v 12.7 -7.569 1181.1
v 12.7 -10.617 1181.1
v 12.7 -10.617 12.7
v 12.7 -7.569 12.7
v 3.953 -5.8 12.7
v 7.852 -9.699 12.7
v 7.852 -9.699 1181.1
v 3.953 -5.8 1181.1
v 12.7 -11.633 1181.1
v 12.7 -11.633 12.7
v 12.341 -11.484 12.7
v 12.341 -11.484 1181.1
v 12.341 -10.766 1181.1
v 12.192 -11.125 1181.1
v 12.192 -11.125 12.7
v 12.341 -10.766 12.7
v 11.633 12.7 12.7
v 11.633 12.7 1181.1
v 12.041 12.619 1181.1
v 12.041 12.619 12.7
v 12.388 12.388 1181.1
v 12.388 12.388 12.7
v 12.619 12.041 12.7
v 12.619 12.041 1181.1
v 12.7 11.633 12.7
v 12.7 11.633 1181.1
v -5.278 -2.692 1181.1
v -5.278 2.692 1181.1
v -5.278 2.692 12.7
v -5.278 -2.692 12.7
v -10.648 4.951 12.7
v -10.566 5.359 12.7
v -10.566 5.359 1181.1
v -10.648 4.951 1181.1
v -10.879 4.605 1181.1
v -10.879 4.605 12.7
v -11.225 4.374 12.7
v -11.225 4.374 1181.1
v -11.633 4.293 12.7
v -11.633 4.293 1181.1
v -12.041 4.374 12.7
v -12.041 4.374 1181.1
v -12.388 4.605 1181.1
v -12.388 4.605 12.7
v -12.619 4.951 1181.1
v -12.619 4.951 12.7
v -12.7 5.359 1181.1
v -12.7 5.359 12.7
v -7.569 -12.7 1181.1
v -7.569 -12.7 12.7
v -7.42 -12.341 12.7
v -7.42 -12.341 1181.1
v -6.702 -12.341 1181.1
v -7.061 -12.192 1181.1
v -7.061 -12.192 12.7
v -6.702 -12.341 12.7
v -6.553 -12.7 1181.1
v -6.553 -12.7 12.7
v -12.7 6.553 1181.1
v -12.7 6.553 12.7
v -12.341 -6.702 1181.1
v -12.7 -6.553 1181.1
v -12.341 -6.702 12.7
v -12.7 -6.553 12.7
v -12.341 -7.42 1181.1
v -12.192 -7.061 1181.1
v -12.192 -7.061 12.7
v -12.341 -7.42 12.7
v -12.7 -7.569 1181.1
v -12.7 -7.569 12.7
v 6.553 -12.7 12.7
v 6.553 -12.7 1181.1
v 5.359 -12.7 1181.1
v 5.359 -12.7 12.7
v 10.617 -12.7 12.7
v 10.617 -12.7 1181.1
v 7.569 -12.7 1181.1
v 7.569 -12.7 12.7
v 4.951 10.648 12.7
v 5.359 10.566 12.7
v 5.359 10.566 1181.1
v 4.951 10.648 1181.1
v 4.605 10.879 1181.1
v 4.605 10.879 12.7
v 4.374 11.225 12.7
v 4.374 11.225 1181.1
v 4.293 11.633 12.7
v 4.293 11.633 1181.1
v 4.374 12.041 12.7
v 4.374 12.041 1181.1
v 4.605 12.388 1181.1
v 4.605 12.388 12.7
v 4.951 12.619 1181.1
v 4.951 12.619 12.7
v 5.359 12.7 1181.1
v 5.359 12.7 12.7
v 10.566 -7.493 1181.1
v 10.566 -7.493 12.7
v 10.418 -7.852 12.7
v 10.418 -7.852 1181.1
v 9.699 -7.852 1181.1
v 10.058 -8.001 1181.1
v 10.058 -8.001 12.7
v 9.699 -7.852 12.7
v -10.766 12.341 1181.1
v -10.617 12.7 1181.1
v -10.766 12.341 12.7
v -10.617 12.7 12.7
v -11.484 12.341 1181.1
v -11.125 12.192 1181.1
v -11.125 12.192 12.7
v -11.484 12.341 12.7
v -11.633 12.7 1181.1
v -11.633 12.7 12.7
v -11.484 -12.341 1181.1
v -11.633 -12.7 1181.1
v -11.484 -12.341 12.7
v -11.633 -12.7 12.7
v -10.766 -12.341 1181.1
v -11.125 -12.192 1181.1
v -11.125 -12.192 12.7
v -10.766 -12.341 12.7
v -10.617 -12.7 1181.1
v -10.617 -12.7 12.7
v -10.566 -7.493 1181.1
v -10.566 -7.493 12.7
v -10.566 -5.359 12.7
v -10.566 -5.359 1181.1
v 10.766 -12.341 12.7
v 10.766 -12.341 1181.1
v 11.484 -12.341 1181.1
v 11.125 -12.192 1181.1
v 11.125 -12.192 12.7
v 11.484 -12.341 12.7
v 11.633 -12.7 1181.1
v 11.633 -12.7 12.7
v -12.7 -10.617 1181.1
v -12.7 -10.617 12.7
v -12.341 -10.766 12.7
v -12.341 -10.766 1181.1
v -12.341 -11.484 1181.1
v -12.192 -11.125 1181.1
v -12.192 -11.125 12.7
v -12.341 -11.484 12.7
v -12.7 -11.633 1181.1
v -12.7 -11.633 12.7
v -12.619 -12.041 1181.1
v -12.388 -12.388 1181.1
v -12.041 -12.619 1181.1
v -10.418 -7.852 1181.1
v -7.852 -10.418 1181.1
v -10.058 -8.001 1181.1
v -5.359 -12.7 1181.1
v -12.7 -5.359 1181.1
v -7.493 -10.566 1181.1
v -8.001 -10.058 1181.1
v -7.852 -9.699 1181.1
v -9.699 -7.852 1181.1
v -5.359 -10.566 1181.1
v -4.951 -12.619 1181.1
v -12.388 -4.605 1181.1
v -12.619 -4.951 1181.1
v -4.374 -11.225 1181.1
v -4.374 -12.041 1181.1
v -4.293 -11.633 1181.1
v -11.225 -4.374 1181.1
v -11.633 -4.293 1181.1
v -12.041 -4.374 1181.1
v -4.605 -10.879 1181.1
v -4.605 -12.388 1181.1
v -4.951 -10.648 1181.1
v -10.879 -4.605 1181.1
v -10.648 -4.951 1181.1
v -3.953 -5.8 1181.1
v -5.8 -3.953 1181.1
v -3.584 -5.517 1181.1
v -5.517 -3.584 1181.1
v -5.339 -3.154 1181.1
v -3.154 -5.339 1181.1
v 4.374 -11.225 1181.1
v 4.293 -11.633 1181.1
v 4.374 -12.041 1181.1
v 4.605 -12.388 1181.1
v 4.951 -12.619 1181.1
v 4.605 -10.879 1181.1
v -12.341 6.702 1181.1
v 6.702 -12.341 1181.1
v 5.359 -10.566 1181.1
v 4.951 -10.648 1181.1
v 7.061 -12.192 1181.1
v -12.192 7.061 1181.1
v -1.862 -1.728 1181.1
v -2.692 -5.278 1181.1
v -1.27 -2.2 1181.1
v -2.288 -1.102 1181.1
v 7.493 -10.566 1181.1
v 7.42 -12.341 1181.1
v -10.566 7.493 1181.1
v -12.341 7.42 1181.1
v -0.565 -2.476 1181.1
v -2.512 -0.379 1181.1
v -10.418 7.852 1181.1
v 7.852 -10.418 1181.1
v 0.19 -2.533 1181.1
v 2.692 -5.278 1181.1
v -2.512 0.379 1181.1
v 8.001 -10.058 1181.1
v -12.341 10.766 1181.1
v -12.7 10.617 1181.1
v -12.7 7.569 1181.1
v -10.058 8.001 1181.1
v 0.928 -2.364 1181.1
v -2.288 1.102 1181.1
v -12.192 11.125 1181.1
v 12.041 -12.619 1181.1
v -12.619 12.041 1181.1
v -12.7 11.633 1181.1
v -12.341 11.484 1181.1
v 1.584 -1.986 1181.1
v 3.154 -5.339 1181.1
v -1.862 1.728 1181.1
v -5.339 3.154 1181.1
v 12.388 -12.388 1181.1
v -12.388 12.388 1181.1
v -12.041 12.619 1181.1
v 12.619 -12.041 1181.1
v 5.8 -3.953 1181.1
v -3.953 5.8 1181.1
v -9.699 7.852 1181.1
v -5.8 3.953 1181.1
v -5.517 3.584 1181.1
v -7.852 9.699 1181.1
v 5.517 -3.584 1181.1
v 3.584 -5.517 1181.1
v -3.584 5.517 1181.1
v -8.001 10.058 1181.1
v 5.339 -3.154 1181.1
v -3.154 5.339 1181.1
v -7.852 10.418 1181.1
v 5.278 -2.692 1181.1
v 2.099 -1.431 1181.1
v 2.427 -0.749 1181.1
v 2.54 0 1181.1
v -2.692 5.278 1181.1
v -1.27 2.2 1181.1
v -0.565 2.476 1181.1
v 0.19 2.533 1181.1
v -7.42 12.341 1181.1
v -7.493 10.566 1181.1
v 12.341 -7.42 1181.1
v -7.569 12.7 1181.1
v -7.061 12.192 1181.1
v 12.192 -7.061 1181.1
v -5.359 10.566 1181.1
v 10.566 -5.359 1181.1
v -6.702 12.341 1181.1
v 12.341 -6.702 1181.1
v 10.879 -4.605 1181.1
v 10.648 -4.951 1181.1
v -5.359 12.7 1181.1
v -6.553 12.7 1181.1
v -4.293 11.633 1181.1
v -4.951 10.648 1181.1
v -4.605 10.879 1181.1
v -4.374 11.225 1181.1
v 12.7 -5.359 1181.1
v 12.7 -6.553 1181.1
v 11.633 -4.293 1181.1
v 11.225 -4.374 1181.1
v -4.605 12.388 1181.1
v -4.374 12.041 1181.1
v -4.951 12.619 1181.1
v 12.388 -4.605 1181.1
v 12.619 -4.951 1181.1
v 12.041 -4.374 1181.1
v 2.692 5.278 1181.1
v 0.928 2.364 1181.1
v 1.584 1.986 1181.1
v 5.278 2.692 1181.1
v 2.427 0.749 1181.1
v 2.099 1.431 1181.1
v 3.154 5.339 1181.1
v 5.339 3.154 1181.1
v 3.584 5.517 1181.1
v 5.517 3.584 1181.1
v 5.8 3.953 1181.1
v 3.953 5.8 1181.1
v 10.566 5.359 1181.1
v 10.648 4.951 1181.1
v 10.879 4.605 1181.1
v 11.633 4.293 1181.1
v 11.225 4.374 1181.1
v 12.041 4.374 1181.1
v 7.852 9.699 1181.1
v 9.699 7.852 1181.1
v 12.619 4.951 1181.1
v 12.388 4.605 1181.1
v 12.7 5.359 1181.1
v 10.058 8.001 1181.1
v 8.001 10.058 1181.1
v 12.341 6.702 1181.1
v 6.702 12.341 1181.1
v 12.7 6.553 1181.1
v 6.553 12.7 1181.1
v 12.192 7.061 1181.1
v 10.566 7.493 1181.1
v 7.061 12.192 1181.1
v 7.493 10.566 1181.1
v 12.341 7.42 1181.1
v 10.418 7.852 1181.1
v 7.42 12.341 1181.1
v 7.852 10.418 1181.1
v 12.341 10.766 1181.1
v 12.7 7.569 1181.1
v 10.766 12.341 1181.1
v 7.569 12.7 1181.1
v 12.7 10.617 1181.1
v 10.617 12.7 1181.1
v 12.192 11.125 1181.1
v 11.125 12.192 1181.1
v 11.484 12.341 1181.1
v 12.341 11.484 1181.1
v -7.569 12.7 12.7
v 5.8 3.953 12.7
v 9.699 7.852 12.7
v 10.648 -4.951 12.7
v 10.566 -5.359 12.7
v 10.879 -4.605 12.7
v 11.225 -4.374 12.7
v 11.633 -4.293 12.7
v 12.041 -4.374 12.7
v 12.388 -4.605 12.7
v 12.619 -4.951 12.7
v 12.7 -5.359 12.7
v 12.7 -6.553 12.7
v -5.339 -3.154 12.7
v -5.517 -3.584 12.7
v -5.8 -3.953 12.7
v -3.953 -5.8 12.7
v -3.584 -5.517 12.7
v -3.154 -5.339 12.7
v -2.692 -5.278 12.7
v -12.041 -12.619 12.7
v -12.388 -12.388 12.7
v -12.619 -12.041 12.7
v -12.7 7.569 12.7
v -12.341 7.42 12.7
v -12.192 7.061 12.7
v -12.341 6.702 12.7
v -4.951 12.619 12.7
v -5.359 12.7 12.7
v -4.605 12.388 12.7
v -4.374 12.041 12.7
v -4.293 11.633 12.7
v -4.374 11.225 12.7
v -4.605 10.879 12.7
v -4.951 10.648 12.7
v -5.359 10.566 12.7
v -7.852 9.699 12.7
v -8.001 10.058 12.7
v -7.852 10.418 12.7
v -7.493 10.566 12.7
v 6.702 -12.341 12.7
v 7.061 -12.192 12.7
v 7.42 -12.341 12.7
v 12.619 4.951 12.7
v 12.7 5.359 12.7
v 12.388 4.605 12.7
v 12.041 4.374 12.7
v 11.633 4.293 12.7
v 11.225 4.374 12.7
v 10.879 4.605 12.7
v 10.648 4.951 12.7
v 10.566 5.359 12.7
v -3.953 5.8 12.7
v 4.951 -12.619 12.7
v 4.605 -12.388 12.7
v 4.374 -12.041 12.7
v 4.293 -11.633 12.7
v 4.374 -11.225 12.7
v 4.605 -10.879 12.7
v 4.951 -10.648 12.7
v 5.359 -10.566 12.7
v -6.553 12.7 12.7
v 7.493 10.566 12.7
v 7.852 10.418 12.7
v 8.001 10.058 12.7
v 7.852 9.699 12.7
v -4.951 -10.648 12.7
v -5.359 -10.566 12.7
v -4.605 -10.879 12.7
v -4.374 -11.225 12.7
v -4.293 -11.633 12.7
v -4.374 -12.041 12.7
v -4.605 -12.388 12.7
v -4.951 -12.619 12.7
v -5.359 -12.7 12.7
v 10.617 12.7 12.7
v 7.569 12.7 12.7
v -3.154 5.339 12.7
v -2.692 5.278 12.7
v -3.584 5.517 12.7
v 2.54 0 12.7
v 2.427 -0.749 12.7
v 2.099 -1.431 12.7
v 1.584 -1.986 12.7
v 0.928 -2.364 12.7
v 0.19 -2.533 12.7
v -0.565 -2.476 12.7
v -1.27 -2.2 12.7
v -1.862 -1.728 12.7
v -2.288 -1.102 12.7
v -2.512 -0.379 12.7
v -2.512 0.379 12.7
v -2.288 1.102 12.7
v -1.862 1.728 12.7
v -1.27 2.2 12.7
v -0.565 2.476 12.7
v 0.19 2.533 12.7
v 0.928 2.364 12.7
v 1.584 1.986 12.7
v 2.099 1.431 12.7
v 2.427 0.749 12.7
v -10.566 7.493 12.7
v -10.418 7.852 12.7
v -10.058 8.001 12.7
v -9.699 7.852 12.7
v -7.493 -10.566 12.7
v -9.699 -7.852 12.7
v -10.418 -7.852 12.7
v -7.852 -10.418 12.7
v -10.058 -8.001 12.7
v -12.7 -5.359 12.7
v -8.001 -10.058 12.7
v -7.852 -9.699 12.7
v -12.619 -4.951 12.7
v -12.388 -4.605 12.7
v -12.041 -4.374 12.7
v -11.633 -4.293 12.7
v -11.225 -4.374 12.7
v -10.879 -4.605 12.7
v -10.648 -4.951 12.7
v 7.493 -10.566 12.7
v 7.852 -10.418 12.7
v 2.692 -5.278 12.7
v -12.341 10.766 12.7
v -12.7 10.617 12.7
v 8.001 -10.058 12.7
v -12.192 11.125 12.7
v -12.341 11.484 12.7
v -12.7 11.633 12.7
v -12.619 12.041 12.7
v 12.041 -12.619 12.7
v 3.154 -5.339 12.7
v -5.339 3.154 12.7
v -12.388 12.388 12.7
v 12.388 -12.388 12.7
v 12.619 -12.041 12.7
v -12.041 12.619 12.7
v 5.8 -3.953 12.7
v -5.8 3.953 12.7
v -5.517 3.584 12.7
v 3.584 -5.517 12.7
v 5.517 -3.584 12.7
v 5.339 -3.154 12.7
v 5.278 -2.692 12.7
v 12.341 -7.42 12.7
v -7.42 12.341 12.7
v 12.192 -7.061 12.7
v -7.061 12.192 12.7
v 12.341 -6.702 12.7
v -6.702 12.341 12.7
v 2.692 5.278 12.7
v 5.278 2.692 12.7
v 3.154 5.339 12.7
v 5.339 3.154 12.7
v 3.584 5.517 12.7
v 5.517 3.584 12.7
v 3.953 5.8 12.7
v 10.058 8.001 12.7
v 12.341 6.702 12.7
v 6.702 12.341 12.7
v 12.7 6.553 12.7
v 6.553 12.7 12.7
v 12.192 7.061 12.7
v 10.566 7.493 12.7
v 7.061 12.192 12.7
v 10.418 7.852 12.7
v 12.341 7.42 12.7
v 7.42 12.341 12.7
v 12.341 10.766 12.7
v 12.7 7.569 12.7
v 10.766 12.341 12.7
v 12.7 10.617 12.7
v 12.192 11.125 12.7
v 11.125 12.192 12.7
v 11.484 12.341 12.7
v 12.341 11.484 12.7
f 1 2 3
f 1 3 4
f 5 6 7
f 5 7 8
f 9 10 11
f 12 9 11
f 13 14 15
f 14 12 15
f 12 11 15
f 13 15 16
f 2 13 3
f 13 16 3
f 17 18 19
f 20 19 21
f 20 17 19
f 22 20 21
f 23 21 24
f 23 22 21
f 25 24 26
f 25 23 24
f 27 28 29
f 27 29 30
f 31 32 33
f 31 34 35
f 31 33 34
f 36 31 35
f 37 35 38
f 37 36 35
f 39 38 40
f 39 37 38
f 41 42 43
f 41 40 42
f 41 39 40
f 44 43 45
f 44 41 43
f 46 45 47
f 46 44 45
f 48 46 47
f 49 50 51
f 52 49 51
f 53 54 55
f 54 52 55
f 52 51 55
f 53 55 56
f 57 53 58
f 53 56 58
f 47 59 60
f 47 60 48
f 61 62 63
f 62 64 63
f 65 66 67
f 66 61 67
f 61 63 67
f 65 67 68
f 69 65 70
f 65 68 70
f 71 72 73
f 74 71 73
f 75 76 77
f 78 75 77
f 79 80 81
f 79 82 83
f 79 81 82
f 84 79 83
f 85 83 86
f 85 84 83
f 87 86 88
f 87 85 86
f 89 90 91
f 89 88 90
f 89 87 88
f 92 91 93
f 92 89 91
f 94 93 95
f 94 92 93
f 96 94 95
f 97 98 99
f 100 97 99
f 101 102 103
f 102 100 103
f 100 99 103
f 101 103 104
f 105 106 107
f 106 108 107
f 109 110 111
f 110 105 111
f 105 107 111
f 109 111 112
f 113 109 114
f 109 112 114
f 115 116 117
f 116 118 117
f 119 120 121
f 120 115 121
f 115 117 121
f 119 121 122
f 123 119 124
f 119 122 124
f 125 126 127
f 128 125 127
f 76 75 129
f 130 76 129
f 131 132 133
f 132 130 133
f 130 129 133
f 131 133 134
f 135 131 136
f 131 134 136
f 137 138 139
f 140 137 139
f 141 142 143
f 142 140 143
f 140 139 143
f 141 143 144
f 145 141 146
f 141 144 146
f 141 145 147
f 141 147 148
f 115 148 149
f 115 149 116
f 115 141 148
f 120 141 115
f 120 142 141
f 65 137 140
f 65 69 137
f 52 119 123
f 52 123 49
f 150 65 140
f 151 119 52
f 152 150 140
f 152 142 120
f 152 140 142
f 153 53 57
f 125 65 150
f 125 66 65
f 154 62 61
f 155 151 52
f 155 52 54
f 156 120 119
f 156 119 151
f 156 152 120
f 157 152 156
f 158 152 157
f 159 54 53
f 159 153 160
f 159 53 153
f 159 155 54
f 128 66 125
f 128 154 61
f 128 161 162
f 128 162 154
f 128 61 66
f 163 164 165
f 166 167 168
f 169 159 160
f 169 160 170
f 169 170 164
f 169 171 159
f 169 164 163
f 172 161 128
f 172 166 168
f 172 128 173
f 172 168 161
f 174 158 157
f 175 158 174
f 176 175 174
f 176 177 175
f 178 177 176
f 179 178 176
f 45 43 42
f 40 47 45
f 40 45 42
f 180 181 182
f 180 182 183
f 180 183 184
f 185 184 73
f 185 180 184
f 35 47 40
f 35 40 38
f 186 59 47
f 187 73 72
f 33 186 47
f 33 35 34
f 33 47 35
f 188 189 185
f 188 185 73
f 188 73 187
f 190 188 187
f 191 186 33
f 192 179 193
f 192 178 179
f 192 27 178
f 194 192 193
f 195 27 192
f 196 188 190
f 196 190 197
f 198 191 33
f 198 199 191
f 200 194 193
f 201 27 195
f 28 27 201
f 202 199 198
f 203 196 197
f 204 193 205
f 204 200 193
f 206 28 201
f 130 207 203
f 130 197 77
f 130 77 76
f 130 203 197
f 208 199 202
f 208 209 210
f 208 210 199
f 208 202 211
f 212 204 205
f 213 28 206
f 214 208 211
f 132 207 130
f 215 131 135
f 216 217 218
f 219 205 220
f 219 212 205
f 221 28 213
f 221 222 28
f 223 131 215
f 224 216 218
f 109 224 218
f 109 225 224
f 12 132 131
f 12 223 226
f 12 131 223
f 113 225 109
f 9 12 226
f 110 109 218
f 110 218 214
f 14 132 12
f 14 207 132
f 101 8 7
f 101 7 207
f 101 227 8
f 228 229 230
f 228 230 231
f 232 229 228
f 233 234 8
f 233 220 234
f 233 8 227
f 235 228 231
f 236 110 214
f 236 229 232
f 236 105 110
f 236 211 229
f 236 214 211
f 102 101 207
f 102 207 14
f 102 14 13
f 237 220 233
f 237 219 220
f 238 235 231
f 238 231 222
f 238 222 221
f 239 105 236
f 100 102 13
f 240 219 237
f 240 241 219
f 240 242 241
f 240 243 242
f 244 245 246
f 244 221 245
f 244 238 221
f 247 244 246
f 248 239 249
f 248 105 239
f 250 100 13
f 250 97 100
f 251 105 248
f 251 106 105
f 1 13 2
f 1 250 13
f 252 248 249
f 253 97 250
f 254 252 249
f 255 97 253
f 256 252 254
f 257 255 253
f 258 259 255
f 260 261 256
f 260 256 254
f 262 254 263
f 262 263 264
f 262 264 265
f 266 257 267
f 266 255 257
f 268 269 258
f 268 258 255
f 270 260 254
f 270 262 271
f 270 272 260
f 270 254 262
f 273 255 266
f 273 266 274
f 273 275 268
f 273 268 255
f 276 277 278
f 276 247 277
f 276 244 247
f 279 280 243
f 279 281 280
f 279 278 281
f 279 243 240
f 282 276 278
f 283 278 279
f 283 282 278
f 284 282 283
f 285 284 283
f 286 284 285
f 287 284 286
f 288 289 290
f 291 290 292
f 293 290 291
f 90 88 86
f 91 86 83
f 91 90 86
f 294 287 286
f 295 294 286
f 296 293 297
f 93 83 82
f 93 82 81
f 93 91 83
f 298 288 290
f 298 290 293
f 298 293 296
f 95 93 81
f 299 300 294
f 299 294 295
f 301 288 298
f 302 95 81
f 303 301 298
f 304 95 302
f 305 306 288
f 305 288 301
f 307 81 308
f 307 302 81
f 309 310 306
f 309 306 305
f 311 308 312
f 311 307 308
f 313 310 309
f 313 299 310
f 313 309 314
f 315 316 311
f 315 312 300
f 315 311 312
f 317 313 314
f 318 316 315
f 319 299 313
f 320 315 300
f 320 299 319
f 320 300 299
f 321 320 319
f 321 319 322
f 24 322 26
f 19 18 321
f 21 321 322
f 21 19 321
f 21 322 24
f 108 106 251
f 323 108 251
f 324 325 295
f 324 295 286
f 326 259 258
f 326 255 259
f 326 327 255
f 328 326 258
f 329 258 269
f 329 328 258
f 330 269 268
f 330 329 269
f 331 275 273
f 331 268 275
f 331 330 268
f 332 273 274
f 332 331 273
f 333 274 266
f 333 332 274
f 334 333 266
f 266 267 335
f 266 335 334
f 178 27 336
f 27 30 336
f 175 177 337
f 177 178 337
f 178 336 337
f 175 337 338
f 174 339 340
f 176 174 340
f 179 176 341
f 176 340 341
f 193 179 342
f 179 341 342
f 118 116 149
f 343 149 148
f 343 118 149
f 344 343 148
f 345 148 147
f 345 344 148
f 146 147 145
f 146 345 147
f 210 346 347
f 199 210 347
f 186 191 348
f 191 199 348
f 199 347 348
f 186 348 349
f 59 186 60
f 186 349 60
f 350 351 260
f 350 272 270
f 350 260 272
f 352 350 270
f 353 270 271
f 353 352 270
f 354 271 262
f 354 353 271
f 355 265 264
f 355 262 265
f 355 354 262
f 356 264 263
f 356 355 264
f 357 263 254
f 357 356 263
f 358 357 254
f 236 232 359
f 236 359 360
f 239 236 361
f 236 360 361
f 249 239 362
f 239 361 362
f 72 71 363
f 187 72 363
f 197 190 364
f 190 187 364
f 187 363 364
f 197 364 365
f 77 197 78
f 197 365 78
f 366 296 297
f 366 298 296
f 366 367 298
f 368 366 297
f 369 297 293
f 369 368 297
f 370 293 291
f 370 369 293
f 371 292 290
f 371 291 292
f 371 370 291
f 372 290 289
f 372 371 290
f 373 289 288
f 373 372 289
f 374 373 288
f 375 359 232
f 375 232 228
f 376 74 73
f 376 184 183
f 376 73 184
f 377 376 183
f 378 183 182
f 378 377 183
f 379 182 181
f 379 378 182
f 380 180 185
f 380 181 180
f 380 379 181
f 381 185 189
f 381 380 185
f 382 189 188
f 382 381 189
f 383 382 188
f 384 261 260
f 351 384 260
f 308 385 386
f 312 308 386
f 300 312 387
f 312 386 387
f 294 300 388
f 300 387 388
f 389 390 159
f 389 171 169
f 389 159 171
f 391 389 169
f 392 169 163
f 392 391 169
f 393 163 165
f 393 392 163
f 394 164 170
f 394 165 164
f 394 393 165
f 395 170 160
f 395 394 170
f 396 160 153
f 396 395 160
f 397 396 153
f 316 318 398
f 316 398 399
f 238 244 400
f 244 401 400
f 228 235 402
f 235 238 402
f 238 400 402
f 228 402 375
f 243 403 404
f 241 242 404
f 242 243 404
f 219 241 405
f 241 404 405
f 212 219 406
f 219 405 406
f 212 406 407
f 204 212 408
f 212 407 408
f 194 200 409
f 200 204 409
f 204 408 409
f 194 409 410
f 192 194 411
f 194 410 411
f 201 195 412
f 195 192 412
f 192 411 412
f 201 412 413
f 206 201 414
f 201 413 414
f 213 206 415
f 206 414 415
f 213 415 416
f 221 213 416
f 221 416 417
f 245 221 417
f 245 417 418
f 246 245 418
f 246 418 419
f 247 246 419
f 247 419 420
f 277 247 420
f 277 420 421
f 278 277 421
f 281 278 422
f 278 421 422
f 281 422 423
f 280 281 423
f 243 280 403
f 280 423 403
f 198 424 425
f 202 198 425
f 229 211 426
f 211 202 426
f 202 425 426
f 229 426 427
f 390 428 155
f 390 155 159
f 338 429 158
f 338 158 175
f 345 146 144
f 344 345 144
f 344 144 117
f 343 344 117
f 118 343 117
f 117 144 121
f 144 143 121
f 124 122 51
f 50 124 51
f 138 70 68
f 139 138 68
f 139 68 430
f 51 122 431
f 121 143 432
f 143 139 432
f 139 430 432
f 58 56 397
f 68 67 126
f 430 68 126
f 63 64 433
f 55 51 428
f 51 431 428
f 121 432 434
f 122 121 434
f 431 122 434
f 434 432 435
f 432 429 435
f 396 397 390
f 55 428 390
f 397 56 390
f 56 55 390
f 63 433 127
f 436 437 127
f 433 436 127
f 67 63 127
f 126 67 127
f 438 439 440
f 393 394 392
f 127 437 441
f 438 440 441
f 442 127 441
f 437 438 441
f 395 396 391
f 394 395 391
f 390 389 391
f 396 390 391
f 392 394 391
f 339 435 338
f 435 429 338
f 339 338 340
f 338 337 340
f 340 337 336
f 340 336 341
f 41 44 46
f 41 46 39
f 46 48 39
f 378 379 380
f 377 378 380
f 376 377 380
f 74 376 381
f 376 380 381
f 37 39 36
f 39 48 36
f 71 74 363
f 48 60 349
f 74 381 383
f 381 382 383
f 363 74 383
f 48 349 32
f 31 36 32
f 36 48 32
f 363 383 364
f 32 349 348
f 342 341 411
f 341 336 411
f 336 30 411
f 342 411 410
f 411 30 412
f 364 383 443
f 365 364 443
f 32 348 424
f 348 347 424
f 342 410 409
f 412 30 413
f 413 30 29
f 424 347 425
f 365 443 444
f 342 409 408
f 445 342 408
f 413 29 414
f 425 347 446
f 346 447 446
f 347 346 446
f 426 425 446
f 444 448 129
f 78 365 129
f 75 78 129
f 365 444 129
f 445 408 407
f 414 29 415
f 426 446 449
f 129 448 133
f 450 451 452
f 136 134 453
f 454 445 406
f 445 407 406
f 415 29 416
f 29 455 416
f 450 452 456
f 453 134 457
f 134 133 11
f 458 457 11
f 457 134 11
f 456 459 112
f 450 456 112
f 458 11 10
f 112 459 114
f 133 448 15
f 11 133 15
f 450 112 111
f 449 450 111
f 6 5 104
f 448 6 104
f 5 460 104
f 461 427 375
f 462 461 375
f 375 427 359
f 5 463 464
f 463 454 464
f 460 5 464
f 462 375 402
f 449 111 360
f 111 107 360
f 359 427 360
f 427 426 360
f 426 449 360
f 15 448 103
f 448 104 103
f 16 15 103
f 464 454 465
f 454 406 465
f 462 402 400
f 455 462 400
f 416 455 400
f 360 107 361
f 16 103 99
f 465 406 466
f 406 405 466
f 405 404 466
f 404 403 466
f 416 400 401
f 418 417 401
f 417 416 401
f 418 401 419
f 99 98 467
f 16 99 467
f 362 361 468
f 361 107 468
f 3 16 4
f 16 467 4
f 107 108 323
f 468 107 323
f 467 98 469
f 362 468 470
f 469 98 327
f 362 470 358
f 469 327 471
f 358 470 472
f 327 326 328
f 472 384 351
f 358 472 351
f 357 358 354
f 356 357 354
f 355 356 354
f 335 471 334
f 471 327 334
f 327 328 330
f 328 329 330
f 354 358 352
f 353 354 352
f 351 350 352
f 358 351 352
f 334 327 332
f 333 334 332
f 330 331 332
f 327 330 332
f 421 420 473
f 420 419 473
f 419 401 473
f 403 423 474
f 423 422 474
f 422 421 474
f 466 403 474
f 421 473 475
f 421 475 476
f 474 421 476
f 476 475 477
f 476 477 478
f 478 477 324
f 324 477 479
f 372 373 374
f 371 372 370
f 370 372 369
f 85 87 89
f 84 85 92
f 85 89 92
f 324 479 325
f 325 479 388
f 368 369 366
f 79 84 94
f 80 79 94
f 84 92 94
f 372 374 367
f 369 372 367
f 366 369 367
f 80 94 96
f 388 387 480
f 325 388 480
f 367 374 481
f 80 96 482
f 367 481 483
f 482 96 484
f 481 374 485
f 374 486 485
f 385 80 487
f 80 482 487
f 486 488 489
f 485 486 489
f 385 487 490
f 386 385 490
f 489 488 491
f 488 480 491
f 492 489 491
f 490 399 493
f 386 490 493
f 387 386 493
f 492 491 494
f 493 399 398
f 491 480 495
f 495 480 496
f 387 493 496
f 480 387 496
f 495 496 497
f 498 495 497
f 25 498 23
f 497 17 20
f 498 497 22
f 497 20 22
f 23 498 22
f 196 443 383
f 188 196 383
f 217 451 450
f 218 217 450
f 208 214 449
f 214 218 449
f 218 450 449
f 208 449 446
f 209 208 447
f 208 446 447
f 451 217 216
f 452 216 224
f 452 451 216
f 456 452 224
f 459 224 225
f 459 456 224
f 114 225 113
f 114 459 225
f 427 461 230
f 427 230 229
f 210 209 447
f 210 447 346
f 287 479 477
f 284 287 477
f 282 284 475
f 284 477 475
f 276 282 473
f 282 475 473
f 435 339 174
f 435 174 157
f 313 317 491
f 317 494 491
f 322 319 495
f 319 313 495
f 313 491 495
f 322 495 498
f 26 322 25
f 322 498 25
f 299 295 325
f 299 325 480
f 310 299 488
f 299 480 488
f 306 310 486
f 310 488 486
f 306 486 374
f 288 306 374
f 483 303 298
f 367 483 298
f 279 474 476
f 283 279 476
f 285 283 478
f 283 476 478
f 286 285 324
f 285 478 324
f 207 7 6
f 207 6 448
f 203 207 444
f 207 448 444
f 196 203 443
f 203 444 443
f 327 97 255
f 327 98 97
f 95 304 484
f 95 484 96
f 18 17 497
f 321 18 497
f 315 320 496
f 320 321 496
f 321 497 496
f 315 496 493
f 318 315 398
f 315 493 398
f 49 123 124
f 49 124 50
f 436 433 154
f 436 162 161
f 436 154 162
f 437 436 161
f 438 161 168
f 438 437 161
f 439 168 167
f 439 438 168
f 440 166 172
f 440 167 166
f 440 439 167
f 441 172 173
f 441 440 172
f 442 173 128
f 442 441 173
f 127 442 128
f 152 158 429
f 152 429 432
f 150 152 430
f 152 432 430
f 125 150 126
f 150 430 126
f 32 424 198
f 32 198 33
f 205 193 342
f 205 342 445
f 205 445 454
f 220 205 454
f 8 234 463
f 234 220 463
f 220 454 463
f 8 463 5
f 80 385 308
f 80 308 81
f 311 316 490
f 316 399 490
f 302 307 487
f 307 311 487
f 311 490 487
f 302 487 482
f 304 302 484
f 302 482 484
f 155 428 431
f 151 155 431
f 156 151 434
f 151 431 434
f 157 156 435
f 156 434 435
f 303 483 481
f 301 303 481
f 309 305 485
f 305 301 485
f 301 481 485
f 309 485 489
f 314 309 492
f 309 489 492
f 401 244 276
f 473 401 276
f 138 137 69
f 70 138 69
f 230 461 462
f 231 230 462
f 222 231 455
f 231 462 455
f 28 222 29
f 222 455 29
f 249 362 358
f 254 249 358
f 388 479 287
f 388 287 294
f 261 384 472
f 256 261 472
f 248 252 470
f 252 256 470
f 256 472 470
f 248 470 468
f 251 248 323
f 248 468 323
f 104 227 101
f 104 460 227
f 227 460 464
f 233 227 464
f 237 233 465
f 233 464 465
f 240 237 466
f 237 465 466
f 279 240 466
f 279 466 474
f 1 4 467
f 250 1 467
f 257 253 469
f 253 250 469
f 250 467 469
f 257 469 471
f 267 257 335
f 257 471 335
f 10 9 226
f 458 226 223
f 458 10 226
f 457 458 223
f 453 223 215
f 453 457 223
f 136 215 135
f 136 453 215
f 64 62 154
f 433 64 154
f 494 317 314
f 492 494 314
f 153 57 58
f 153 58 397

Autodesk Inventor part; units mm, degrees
ref_plane "Start Plane" through (0, 0, 12.7) normal (0, 0, 1) x (1, 0, 0)
ref_plane "End Plane" through (0, 0, 1181.1) normal (0, 0, 1) x (1, 0, 0)
sketch "Sketch" plane through (0, 0, 0) normal (0, 0, 1) x (1, 0, 0)
  arc A0 (-11.6332, 12.7) -> (-12.7, 11.6332) centre (-11.6332, 11.6332) ccw
  arc A1 (-5.3594, 10.5664) -> (-5.3594, 12.7) centre (-5.3594, 11.6332) ccw
  arc A2 (-12.7, 5.3594) -> (-10.5664, 5.3594) centre (-11.6332, 5.3594) ccw
  line L0 (-10.5664, 7.493) -> (-10.5664, 5.3594)
  line L1 (-7.493, 10.5664) -> (-5.3594, 10.5664)
  arc A3 (-9.6992, 7.8522) -> (-10.5664, 7.493) centre (-10.0584, 7.493) ccw
  arc A4 (-7.493, 10.5664) -> (-7.8522, 9.6992) centre (-7.493, 10.0584) ccw
  line L2 (-11.6332, 11.6332) -> (0, 0) construction
  line L3 (-5.8003, 3.9533) -> (-9.6992, 7.8522)
  line L4 (-7.8522, 9.6992) -> (-3.9533, 5.8003)
  arc A5 (-3.9533, 5.8003) -> (-2.6924, 5.278) centre (-2.6924, 7.0612) ccw
  arc A6 (-5.278, 2.6924) -> (-5.8003, 3.9533) centre (-7.0612, 2.6924) ccw
  arc A7 (0, 2.54) -> (-2.54, 0) centre (0, 0) ccw construction
  line L5 (0, 0) -> (-12.7, 0) construction
  line L6 (0, 12.7) -> (0, 0) construction
  arc A8 (-11.6332, 12.7) -> (-10.6172, 12.7) centre (-11.1252, 12.7) ccw
  arc A9 (-7.5692, 12.7) -> (-6.5532, 12.7) centre (-7.0612, 12.7) ccw
  arc A10 (-12.7, 10.6172) -> (-12.7, 11.6332) centre (-12.7, 11.1252) ccw
  arc A11 (-12.7, 6.5532) -> (-12.7, 7.5692) centre (-12.7, 7.0612) ccw
  line L7 (-12.7, 10.6172) -> (-12.7, 7.5692)
  line L8 (-12.7, 6.5532) -> (-12.7, 5.3594)
  line L9 (-10.6172, 12.7) -> (-7.5692, 12.7)
  line L10 (-6.5532, 12.7) -> (-5.3594, 12.7)
  circle A12 centre (0, 0) radius 2.54
  arc A13 (-12.7, -11.6332) -> (-11.6332, -12.7) centre (-11.6332, -11.6332) ccw
  line L11 (-12.7, -10.6172) -> (-12.7, -7.5692)
  arc A14 (-10.5664, -7.493) -> (-9.6992, -7.8522) centre (-10.0584, -7.493) ccw
  line L12 (-9.6992, -7.8522) -> (-5.8003, -3.9533)
  line L13 (-11.6332, -11.6332) -> (0, 0) construction
  line L14 (-3.9533, -5.8003) -> (-7.8522, -9.6992)
  arc A15 (-7.8522, -9.6992) -> (-7.493, -10.5664) centre (-7.493, -10.0584) ccw
  line L15 (-10.6172, -12.7) -> (-7.5692, -12.7)
  line L16 (-7.493, -10.5664) -> (-5.3594, -10.5664)
  arc A16 (-6.5532, -12.7) -> (-7.5692, -12.7) centre (-7.0612, -12.7) ccw
  line L17 (-6.5532, -12.7) -> (-5.3594, -12.7)
  arc A17 (-5.3594, -12.7) -> (-5.3594, -10.5664) centre (-5.3594, -11.6332) ccw
  arc A18 (-10.6172, -12.7) -> (-11.6332, -12.7) centre (-11.1252, -12.7) ccw
  arc A19 (-12.7, -11.6332) -> (-12.7, -10.6172) centre (-12.7, -11.1252) ccw
  arc A20 (-2.6924, -5.278) -> (-3.9533, -5.8003) centre (-2.6924, -7.0612) ccw
  arc A21 (-5.8003, -3.9533) -> (-5.278, -2.6924) centre (-7.0612, -2.6924) ccw
  line L18 (-10.5664, -7.493) -> (-10.5664, -5.3594)
  line L19 (-12.7, -6.5532) -> (-12.7, -5.3594)
  arc A22 (-10.5664, -5.3594) -> (-12.7, -5.3594) centre (-11.6332, -5.3594) ccw
  arc A23 (-12.7, -7.5692) -> (-12.7, -6.5532) centre (-12.7, -7.0612) ccw
  arc A24 (11.6332, -12.7) -> (12.7, -11.6332) centre (11.6332, -11.6332) ccw
  line L20 (10.6172, -12.7) -> (7.5692, -12.7)
  arc A25 (7.493, -10.5664) -> (7.8522, -9.6992) centre (7.493, -10.0584) ccw
  line L21 (7.8522, -9.6992) -> (3.9533, -5.8003)
  line L22 (11.6332, -11.6332) -> (0, 0) construction
  line L23 (5.8003, -3.9533) -> (9.6992, -7.8522)
  arc A26 (9.6992, -7.8522) -> (10.5664, -7.493) centre (10.0584, -7.493) ccw
  line L24 (12.7, -10.6172) -> (12.7, -7.5692)
  line L25 (10.5664, -7.493) -> (10.5664, -5.3594)
  arc A27 (12.7, -6.5532) -> (12.7, -7.5692) centre (12.7, -7.0612) ccw
  line L26 (12.7, -6.5532) -> (12.7, -5.3594)
  arc A28 (12.7, -5.3594) -> (10.5664, -5.3594) centre (11.6332, -5.3594) ccw
  arc A29 (12.7, -10.6172) -> (12.7, -11.6332) centre (12.7, -11.1252) ccw
  arc A30 (11.6332, -12.7) -> (10.6172, -12.7) centre (11.1252, -12.7) ccw
  arc A31 (5.278, -2.6924) -> (5.8003, -3.9533) centre (7.0612, -2.6924) ccw
  arc A32 (3.9533, -5.8003) -> (2.6924, -5.278) centre (2.6924, -7.0612) ccw
  line L27 (7.493, -10.5664) -> (5.3594, -10.5664)
  line L28 (6.5532, -12.7) -> (5.3594, -12.7)
  arc A33 (5.3594, -10.5664) -> (5.3594, -12.7) centre (5.3594, -11.6332) ccw
  arc A34 (7.5692, -12.7) -> (6.5532, -12.7) centre (7.0612, -12.7) ccw
  arc A35 (12.7, 11.6332) -> (11.6332, 12.7) centre (11.6332, 11.6332) ccw
  line L29 (12.7, 10.6172) -> (12.7, 7.5692)
  arc A36 (10.5664, 7.493) -> (9.6992, 7.8522) centre (10.0584, 7.493) ccw
  line L30 (9.6992, 7.8522) -> (5.8003, 3.9533)
  line L31 (11.6332, 11.6332) -> (0, 0) construction
  line L32 (3.9533, 5.8003) -> (7.8522, 9.6992)
  arc A37 (7.8522, 9.6992) -> (7.493, 10.5664) centre (7.493, 10.0584) ccw
  line L33 (10.6172, 12.7) -> (7.5692, 12.7)
  line L34 (7.493, 10.5664) -> (5.3594, 10.5664)
  arc A38 (6.5532, 12.7) -> (7.5692, 12.7) centre (7.0612, 12.7) ccw
  line L35 (6.5532, 12.7) -> (5.3594, 12.7)
  arc A39 (5.3594, 12.7) -> (5.3594, 10.5664) centre (5.3594, 11.6332) ccw
  arc A40 (10.6172, 12.7) -> (11.6332, 12.7) centre (11.1252, 12.7) ccw
  arc A41 (12.7, 11.6332) -> (12.7, 10.6172) centre (12.7, 11.1252) ccw
  arc A42 (2.6924, 5.278) -> (3.9533, 5.8003) centre (2.6924, 7.0612) ccw
  arc A43 (5.8003, 3.9533) -> (5.278, 2.6924) centre (7.0612, 2.6924) ccw
  line L36 (10.5664, 7.493) -> (10.5664, 5.3594)
  line L37 (12.7, 6.5532) -> (12.7, 5.3594)
  arc A44 (10.5664, 5.3594) -> (12.7, 5.3594) centre (11.6332, 5.3594) ccw
  arc A45 (12.7, 7.5692) -> (12.7, 6.5532) centre (12.7, 7.0612) ccw
  line L38 (-2.6924, 5.278) -> (2.6924, 5.278)
  line L39 (-5.278, 2.6924) -> (-5.278, -2.6924)
  line L40 (-2.6924, -5.278) -> (2.6924, -5.278)
  line L41 (5.278, -2.6924) -> (5.278, 2.6924)
  point P0 (0, 0)
  point P1 (0, 0)
  dimension "d2" = 2.1336
  dimension "d3" = 6.2738
  dimension "d4" = 6.2738
  dimension "d5" = 1.0668
  dimension "d6" = 2.1336
  dimension "d7" = 2.1336
  dimension "d8" = 1.016
  dimension "d9" = 1.016
  dimension "d10" = 135
  dimension "d11" = 2.667
  dimension "d12" = 4.572
  dimension "d13" = 4.572
  dimension "d14" = 2.667
  dimension "d15" = 5.08
  dimension "d16" = 45
  dimension "d19" = 45
  dimension "d20" = 0.508
  dimension "d21" = 4.572
  dimension "d22" = 1.016
  dimension "d23" = 4.572
  dimension "d24" = 1.016
  dimension "d25" = 0.508
  dimension "d26" = 0.508
  dimension "d27" = 0.508
  dimension "d28" = 12.7
  dimension "d37" = 360
  dimension "d47" = 10.5664
  dimension "d48" = 12.7
extrude "Body" add sketch "Sketch" along normal up to surface (1168.4 mm away) from surface at 12.7
sketch "Sketch2" plane through (0, 0, 0) normal (0, 0, 1) x (1, 0, 0)
  line L0 (0, 0) -> (10, 0)
ref_plane "Work Plane3" through (0, 0, 0) normal (0, -1, 0) x (1, 0, 0)
sketch "Sketch3" plane through (0, 0, 0) normal (0, -1, 0) x (1, 0, 0)
  line L0 (-2, 12.7) -> (12, 12.7)
  line L1 (-2, 1181.1) -> (12, 1181.1)
  dimension "d60" = 1168.4
ref_plane "Work Plane4" through (7.5692, -279.4, 1181.1) normal (0, 0, 1) x (1, 0, 0)
split "Split1" plane through (7.5692, -279.4, 1181.1) removes the side toward (0, 0, 1)
ref_plane "Work Plane5" through (7.5692, 0, 12.7) normal (0, 0, -1) x (-1, 0, 0)
split "Split2" plane through (7.5692, 0, 12.7) removes the side toward (0, 0, -1)
equation "\"d3\" = d4"
equation "\"d6\" = d7"
equation "\"d11\" = d14"
equation "\"d12\" = d13"
equation "\"d23\" = d21"
equation "\"d24\" = d30"
equation "\"d26\" = 0.5 * d24"
equation "\"d27\" = 0.5 * d22"
equation "\"Width\" = 2 * d28"
equation "\"Height\" = 2 * d48"
equation "\"G_OFFSET_START\" = -12.7"
equation "\"G_OFFSET_END\" = -12.7"
equation "\"d55\" = -G_OFFSET_START"
equation "\"d56\" = Length + G_OFFSET_END"
equation "\"G_L\" = 1193.8"
equation "\"d30\" = 1.016"
equation "\"Length\" = 1193.8"
properties part number "1010_80_20" material "Aluminum-6061"
